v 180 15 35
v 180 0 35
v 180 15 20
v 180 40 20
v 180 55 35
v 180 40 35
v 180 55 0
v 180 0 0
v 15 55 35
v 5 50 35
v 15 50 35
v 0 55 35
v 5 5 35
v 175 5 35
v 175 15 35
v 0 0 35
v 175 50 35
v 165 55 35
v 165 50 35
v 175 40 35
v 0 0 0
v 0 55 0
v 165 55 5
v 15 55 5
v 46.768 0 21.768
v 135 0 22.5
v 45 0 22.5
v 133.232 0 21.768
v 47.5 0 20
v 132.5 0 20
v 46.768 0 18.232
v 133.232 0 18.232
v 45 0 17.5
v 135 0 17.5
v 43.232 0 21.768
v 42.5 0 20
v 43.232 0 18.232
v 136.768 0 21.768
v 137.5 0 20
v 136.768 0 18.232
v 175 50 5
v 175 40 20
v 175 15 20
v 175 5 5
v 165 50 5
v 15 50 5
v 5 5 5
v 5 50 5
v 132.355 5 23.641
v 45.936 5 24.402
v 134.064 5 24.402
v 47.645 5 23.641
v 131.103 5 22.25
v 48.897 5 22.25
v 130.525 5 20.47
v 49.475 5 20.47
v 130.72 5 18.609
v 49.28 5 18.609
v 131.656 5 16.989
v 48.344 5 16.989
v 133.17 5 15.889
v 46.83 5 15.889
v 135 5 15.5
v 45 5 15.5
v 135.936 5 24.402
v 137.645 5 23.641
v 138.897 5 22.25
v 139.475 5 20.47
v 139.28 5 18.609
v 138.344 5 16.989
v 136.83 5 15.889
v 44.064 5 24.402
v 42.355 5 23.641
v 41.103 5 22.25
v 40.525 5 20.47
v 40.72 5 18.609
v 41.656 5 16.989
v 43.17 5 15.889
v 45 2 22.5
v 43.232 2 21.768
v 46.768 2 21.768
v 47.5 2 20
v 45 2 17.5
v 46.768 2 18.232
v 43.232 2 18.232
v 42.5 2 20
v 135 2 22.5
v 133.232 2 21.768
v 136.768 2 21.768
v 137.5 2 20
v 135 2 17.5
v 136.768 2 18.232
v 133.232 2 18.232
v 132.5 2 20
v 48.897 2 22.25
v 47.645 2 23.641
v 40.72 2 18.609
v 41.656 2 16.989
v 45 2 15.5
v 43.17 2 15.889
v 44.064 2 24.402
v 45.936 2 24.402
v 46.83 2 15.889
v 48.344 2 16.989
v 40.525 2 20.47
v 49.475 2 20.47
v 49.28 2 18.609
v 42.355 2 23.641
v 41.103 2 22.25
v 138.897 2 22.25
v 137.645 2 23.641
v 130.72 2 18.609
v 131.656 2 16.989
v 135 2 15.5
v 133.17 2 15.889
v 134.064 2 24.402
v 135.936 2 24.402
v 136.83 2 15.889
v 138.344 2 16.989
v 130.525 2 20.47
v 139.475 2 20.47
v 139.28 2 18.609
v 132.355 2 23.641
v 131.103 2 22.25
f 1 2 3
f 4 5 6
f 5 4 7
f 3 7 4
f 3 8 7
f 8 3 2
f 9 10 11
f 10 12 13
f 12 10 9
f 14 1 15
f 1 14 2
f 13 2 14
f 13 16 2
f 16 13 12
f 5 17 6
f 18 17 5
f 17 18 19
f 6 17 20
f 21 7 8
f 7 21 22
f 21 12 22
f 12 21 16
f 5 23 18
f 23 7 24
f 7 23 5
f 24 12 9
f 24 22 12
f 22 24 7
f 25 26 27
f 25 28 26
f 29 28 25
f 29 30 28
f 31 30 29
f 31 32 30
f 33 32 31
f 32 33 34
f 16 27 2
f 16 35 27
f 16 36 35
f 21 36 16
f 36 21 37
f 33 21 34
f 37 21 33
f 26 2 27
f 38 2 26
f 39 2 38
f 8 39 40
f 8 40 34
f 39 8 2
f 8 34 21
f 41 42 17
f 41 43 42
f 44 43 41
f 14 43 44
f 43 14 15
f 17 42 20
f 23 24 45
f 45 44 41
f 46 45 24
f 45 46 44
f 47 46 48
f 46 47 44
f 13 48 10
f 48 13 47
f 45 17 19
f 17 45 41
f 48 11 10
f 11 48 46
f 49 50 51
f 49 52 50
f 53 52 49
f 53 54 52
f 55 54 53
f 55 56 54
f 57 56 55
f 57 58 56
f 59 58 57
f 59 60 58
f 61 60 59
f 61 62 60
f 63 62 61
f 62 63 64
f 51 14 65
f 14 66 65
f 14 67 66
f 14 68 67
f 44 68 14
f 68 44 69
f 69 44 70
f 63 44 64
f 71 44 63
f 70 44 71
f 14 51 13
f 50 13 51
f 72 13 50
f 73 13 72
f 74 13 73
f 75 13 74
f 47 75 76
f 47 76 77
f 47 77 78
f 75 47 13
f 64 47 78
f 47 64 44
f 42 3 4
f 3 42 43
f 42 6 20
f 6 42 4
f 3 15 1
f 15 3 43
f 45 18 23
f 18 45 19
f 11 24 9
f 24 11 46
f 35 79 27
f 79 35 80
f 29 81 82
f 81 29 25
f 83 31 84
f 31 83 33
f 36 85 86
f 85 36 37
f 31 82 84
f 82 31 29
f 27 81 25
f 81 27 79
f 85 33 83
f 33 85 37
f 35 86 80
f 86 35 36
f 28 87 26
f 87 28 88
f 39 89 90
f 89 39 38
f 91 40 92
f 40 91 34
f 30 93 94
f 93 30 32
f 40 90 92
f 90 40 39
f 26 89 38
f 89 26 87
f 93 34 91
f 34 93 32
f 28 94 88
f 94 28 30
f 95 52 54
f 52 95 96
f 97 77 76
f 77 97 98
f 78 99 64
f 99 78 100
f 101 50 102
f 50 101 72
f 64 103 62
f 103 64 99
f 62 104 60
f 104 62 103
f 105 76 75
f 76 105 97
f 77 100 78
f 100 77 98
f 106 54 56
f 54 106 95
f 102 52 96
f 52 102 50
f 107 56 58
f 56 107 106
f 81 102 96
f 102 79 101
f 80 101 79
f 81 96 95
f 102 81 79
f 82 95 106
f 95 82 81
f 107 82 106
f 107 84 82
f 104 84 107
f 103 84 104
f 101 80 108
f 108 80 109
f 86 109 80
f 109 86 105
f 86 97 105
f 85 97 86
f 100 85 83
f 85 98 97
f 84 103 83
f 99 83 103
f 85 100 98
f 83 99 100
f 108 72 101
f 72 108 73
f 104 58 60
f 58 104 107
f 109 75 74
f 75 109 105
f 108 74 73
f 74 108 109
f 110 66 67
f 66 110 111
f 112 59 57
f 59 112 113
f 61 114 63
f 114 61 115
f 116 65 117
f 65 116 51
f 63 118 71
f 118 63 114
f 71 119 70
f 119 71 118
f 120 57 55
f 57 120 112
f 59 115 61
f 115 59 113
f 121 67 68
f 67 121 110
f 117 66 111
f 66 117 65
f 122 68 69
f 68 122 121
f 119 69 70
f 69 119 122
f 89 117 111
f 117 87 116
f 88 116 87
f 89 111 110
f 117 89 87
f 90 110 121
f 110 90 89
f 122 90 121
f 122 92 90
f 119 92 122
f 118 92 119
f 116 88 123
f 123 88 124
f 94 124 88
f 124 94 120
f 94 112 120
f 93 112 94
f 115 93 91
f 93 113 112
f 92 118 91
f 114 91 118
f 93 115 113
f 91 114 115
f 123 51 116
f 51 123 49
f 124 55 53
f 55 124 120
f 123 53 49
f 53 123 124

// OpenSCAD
difference()
{
    cube([180,55,35]);
    translate([5,5,5]) cube([170,45,35]);
    translate([99,15,20]) cube([99,25,35]);
    translate([15,15,5]) cube([150,50,35]);
    translate([45,10,20]) rotate([90,90,0]) cylinder(h=15,d=5);
    translate([135,10,20]) rotate([90,90,0]) cylinder(h=15,d=5);
    translate([45,6,20]) rotate([90,90,0]) cylinder(h=4,d=9);
    translate([135,6,20]) rotate([90,90,0]) cylinder(h=4,d=9);    
}
